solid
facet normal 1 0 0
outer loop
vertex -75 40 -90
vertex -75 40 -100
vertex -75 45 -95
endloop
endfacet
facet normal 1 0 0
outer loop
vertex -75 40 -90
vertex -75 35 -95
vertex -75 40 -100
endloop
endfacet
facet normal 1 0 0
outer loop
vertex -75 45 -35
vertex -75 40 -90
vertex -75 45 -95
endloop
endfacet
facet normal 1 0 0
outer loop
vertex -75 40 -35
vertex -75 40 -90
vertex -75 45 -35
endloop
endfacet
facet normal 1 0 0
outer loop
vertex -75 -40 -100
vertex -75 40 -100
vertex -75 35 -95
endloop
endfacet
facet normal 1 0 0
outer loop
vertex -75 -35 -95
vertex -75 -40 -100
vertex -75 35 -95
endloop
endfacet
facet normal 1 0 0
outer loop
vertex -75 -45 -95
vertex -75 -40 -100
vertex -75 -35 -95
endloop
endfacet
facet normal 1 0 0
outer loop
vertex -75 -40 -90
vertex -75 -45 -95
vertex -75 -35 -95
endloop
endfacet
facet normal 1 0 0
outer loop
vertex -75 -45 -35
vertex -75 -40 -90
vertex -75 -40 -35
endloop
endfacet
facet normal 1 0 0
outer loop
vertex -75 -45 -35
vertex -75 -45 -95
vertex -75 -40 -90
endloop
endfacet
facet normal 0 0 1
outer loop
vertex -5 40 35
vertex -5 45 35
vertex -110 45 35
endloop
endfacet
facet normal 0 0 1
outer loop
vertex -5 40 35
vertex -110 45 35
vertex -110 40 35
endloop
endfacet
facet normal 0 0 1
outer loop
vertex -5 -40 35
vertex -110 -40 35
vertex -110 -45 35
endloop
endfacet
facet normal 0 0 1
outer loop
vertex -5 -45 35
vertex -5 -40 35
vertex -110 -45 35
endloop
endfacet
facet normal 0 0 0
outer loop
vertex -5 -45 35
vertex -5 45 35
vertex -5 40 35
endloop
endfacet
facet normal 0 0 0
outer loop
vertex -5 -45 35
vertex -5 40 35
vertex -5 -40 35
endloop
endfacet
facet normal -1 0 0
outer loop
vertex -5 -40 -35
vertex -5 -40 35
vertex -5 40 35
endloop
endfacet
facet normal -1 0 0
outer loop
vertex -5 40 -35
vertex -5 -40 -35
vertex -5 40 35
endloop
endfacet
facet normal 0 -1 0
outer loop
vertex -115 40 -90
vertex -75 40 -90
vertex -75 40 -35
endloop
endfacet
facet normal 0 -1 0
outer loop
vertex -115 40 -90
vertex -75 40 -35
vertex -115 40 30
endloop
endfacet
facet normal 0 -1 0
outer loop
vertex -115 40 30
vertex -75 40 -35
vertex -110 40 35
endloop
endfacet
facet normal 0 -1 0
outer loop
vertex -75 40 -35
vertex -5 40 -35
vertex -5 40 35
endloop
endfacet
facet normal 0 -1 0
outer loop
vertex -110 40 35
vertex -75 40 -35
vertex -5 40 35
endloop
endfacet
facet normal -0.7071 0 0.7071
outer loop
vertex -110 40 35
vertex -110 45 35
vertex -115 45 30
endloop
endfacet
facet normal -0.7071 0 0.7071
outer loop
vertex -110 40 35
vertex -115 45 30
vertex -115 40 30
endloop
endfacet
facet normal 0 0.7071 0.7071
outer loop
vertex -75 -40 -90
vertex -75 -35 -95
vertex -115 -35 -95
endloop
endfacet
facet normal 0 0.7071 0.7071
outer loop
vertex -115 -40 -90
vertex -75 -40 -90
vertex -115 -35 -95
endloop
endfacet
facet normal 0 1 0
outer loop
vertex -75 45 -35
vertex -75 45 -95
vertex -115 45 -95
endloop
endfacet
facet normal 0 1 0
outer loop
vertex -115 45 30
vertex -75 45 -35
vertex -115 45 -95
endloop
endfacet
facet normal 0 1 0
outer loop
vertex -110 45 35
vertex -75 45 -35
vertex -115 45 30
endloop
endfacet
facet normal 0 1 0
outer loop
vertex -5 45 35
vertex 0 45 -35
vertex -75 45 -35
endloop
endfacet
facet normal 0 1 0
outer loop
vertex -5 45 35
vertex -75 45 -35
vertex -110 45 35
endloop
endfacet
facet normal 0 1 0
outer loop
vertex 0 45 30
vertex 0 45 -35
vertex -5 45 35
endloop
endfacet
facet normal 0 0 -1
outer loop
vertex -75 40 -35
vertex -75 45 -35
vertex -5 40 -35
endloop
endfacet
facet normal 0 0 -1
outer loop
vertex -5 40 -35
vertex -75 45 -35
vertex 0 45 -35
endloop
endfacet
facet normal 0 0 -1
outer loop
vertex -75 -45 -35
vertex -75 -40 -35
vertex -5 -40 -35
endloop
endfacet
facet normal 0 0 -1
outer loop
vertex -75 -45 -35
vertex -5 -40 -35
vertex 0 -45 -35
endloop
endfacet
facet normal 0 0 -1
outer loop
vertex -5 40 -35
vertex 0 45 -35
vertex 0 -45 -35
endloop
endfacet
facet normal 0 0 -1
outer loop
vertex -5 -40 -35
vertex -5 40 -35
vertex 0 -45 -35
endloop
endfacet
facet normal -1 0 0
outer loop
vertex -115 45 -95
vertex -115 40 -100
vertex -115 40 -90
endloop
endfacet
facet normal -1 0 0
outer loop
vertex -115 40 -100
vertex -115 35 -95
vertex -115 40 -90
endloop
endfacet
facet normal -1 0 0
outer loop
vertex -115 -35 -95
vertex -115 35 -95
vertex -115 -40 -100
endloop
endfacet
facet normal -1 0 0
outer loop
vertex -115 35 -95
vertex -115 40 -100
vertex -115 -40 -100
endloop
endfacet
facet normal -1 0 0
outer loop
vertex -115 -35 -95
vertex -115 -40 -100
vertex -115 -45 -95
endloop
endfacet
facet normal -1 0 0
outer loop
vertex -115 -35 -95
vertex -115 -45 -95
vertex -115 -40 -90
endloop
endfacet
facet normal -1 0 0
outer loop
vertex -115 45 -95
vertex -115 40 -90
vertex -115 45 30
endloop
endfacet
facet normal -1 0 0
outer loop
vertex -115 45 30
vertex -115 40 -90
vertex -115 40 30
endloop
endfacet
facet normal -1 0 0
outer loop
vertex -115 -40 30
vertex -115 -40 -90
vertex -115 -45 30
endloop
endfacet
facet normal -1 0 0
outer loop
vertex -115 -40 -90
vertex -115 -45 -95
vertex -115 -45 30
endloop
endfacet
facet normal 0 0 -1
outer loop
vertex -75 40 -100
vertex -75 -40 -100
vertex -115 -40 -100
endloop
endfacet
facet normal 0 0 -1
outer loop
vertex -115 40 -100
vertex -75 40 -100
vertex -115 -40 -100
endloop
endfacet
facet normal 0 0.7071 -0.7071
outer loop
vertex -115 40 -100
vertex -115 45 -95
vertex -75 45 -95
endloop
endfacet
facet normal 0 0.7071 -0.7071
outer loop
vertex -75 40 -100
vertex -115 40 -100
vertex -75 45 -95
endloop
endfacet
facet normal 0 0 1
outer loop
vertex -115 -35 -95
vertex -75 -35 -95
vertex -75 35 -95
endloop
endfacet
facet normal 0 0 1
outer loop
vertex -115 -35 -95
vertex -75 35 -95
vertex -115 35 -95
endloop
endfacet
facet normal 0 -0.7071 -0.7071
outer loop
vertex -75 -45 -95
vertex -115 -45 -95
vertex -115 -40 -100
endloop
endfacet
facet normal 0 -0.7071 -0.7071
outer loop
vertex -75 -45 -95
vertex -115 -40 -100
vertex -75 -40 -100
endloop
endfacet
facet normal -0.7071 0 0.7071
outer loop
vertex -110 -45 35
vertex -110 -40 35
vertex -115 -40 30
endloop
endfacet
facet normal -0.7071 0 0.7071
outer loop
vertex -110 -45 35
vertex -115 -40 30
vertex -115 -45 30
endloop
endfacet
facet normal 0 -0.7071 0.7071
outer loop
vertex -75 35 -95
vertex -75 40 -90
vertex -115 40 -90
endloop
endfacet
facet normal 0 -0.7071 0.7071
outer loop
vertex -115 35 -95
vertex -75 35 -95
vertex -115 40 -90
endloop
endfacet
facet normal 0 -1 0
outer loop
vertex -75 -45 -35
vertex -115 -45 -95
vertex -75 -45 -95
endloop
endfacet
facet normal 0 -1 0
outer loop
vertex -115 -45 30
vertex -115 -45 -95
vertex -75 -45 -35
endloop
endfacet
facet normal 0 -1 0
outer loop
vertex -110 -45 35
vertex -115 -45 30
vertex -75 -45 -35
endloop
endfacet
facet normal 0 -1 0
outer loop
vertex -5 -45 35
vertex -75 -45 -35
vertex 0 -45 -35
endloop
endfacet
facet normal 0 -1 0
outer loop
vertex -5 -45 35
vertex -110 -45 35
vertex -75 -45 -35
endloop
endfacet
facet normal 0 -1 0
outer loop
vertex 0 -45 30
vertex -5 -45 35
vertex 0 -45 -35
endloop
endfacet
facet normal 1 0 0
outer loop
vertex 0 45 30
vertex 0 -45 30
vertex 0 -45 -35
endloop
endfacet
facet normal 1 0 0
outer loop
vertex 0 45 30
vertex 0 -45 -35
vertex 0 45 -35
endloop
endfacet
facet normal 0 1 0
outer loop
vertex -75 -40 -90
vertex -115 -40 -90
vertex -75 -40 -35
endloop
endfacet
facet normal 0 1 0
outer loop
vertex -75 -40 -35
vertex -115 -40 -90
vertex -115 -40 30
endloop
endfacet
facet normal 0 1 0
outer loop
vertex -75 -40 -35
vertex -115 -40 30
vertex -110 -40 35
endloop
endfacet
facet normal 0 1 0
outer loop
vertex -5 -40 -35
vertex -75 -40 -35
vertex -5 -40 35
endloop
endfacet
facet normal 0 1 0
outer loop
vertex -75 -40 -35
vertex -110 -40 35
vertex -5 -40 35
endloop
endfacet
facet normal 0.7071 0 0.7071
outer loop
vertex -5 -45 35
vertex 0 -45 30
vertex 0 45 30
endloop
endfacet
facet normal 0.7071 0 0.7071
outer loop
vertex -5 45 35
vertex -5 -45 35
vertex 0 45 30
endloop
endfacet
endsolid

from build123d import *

# Parameters (mm, degrees)
F0_W     = 90
F0_H     = 70
F1_DEPTH = 5
F2_W     = 5
F2_H     = 70
F3_DEPTH = 110
F4_W     = 40
F4_H     = 5
F5_DEPTH = 65
F6_W     = 40
F6_H     = 5
F7_DEPTH = 80
F8_SIZE  = 4.99999


# Not quite as in the source:
# - a fillet or chamfer is up to 0.001 mm smaller than in the source, because OpenCascade refuses the exact size


with BuildPart() as f1:
    # F0 (on Right) → F1 (new body)
    with BuildSketch(Plane.YZ):
        Rectangle(F0_W, F0_H)
    extrude(amount=-F1_DEPTH)

    # F2 (on face) → F3 (join)
    with BuildSketch(Plane(origin=(-5, 0, 0), x_dir=(0, -1, 0), z_dir=(-1, 0, 0))):
        with Locations((-42.5, 0)):
            Rectangle(F2_W, F2_H)
        with Locations((42.5, 0)):
            Rectangle(F2_W, F2_H)
    extrude(amount=F3_DEPTH)

    # F4 (on face) → F5 (join)
    with BuildSketch(Plane(origin=(0, 0, -35), x_dir=(1, 0, 0), z_dir=(0, 0, -1))):
        with Locations((-95, 42.5)):
            Rectangle(F4_W, F4_H)
        with Locations((-95, -42.5)):
            Rectangle(F4_W, F4_H)
    extrude(amount=F5_DEPTH)

    # F6 (on face) → F7 (join, through all)
    with BuildSketch(Plane(origin=(0, -40, 0), x_dir=(-1, 0, 0), z_dir=(0, 1, 0))):
        with Locations((95, -97.5)):
            Rectangle(F6_W, F6_H)
    extrude(amount=F7_DEPTH)

    # F8 (size 5 in the source; OpenCascade refuses exactly that, so slightly less here)
    f8_edges = [f1.edges().sort_by_distance(p)[0] for p in [
        (0, 0, 35),
        (-115, 42.5, 35),
        (-115, -42.5, 35),
        (-95, -45, -100),
        (-95, -40, -95),
        (-95, 40, -95),
        (-95, 45, -100),
    ]]
    chamfer(f8_edges, length=F8_SIZE)


solid = f1.part
